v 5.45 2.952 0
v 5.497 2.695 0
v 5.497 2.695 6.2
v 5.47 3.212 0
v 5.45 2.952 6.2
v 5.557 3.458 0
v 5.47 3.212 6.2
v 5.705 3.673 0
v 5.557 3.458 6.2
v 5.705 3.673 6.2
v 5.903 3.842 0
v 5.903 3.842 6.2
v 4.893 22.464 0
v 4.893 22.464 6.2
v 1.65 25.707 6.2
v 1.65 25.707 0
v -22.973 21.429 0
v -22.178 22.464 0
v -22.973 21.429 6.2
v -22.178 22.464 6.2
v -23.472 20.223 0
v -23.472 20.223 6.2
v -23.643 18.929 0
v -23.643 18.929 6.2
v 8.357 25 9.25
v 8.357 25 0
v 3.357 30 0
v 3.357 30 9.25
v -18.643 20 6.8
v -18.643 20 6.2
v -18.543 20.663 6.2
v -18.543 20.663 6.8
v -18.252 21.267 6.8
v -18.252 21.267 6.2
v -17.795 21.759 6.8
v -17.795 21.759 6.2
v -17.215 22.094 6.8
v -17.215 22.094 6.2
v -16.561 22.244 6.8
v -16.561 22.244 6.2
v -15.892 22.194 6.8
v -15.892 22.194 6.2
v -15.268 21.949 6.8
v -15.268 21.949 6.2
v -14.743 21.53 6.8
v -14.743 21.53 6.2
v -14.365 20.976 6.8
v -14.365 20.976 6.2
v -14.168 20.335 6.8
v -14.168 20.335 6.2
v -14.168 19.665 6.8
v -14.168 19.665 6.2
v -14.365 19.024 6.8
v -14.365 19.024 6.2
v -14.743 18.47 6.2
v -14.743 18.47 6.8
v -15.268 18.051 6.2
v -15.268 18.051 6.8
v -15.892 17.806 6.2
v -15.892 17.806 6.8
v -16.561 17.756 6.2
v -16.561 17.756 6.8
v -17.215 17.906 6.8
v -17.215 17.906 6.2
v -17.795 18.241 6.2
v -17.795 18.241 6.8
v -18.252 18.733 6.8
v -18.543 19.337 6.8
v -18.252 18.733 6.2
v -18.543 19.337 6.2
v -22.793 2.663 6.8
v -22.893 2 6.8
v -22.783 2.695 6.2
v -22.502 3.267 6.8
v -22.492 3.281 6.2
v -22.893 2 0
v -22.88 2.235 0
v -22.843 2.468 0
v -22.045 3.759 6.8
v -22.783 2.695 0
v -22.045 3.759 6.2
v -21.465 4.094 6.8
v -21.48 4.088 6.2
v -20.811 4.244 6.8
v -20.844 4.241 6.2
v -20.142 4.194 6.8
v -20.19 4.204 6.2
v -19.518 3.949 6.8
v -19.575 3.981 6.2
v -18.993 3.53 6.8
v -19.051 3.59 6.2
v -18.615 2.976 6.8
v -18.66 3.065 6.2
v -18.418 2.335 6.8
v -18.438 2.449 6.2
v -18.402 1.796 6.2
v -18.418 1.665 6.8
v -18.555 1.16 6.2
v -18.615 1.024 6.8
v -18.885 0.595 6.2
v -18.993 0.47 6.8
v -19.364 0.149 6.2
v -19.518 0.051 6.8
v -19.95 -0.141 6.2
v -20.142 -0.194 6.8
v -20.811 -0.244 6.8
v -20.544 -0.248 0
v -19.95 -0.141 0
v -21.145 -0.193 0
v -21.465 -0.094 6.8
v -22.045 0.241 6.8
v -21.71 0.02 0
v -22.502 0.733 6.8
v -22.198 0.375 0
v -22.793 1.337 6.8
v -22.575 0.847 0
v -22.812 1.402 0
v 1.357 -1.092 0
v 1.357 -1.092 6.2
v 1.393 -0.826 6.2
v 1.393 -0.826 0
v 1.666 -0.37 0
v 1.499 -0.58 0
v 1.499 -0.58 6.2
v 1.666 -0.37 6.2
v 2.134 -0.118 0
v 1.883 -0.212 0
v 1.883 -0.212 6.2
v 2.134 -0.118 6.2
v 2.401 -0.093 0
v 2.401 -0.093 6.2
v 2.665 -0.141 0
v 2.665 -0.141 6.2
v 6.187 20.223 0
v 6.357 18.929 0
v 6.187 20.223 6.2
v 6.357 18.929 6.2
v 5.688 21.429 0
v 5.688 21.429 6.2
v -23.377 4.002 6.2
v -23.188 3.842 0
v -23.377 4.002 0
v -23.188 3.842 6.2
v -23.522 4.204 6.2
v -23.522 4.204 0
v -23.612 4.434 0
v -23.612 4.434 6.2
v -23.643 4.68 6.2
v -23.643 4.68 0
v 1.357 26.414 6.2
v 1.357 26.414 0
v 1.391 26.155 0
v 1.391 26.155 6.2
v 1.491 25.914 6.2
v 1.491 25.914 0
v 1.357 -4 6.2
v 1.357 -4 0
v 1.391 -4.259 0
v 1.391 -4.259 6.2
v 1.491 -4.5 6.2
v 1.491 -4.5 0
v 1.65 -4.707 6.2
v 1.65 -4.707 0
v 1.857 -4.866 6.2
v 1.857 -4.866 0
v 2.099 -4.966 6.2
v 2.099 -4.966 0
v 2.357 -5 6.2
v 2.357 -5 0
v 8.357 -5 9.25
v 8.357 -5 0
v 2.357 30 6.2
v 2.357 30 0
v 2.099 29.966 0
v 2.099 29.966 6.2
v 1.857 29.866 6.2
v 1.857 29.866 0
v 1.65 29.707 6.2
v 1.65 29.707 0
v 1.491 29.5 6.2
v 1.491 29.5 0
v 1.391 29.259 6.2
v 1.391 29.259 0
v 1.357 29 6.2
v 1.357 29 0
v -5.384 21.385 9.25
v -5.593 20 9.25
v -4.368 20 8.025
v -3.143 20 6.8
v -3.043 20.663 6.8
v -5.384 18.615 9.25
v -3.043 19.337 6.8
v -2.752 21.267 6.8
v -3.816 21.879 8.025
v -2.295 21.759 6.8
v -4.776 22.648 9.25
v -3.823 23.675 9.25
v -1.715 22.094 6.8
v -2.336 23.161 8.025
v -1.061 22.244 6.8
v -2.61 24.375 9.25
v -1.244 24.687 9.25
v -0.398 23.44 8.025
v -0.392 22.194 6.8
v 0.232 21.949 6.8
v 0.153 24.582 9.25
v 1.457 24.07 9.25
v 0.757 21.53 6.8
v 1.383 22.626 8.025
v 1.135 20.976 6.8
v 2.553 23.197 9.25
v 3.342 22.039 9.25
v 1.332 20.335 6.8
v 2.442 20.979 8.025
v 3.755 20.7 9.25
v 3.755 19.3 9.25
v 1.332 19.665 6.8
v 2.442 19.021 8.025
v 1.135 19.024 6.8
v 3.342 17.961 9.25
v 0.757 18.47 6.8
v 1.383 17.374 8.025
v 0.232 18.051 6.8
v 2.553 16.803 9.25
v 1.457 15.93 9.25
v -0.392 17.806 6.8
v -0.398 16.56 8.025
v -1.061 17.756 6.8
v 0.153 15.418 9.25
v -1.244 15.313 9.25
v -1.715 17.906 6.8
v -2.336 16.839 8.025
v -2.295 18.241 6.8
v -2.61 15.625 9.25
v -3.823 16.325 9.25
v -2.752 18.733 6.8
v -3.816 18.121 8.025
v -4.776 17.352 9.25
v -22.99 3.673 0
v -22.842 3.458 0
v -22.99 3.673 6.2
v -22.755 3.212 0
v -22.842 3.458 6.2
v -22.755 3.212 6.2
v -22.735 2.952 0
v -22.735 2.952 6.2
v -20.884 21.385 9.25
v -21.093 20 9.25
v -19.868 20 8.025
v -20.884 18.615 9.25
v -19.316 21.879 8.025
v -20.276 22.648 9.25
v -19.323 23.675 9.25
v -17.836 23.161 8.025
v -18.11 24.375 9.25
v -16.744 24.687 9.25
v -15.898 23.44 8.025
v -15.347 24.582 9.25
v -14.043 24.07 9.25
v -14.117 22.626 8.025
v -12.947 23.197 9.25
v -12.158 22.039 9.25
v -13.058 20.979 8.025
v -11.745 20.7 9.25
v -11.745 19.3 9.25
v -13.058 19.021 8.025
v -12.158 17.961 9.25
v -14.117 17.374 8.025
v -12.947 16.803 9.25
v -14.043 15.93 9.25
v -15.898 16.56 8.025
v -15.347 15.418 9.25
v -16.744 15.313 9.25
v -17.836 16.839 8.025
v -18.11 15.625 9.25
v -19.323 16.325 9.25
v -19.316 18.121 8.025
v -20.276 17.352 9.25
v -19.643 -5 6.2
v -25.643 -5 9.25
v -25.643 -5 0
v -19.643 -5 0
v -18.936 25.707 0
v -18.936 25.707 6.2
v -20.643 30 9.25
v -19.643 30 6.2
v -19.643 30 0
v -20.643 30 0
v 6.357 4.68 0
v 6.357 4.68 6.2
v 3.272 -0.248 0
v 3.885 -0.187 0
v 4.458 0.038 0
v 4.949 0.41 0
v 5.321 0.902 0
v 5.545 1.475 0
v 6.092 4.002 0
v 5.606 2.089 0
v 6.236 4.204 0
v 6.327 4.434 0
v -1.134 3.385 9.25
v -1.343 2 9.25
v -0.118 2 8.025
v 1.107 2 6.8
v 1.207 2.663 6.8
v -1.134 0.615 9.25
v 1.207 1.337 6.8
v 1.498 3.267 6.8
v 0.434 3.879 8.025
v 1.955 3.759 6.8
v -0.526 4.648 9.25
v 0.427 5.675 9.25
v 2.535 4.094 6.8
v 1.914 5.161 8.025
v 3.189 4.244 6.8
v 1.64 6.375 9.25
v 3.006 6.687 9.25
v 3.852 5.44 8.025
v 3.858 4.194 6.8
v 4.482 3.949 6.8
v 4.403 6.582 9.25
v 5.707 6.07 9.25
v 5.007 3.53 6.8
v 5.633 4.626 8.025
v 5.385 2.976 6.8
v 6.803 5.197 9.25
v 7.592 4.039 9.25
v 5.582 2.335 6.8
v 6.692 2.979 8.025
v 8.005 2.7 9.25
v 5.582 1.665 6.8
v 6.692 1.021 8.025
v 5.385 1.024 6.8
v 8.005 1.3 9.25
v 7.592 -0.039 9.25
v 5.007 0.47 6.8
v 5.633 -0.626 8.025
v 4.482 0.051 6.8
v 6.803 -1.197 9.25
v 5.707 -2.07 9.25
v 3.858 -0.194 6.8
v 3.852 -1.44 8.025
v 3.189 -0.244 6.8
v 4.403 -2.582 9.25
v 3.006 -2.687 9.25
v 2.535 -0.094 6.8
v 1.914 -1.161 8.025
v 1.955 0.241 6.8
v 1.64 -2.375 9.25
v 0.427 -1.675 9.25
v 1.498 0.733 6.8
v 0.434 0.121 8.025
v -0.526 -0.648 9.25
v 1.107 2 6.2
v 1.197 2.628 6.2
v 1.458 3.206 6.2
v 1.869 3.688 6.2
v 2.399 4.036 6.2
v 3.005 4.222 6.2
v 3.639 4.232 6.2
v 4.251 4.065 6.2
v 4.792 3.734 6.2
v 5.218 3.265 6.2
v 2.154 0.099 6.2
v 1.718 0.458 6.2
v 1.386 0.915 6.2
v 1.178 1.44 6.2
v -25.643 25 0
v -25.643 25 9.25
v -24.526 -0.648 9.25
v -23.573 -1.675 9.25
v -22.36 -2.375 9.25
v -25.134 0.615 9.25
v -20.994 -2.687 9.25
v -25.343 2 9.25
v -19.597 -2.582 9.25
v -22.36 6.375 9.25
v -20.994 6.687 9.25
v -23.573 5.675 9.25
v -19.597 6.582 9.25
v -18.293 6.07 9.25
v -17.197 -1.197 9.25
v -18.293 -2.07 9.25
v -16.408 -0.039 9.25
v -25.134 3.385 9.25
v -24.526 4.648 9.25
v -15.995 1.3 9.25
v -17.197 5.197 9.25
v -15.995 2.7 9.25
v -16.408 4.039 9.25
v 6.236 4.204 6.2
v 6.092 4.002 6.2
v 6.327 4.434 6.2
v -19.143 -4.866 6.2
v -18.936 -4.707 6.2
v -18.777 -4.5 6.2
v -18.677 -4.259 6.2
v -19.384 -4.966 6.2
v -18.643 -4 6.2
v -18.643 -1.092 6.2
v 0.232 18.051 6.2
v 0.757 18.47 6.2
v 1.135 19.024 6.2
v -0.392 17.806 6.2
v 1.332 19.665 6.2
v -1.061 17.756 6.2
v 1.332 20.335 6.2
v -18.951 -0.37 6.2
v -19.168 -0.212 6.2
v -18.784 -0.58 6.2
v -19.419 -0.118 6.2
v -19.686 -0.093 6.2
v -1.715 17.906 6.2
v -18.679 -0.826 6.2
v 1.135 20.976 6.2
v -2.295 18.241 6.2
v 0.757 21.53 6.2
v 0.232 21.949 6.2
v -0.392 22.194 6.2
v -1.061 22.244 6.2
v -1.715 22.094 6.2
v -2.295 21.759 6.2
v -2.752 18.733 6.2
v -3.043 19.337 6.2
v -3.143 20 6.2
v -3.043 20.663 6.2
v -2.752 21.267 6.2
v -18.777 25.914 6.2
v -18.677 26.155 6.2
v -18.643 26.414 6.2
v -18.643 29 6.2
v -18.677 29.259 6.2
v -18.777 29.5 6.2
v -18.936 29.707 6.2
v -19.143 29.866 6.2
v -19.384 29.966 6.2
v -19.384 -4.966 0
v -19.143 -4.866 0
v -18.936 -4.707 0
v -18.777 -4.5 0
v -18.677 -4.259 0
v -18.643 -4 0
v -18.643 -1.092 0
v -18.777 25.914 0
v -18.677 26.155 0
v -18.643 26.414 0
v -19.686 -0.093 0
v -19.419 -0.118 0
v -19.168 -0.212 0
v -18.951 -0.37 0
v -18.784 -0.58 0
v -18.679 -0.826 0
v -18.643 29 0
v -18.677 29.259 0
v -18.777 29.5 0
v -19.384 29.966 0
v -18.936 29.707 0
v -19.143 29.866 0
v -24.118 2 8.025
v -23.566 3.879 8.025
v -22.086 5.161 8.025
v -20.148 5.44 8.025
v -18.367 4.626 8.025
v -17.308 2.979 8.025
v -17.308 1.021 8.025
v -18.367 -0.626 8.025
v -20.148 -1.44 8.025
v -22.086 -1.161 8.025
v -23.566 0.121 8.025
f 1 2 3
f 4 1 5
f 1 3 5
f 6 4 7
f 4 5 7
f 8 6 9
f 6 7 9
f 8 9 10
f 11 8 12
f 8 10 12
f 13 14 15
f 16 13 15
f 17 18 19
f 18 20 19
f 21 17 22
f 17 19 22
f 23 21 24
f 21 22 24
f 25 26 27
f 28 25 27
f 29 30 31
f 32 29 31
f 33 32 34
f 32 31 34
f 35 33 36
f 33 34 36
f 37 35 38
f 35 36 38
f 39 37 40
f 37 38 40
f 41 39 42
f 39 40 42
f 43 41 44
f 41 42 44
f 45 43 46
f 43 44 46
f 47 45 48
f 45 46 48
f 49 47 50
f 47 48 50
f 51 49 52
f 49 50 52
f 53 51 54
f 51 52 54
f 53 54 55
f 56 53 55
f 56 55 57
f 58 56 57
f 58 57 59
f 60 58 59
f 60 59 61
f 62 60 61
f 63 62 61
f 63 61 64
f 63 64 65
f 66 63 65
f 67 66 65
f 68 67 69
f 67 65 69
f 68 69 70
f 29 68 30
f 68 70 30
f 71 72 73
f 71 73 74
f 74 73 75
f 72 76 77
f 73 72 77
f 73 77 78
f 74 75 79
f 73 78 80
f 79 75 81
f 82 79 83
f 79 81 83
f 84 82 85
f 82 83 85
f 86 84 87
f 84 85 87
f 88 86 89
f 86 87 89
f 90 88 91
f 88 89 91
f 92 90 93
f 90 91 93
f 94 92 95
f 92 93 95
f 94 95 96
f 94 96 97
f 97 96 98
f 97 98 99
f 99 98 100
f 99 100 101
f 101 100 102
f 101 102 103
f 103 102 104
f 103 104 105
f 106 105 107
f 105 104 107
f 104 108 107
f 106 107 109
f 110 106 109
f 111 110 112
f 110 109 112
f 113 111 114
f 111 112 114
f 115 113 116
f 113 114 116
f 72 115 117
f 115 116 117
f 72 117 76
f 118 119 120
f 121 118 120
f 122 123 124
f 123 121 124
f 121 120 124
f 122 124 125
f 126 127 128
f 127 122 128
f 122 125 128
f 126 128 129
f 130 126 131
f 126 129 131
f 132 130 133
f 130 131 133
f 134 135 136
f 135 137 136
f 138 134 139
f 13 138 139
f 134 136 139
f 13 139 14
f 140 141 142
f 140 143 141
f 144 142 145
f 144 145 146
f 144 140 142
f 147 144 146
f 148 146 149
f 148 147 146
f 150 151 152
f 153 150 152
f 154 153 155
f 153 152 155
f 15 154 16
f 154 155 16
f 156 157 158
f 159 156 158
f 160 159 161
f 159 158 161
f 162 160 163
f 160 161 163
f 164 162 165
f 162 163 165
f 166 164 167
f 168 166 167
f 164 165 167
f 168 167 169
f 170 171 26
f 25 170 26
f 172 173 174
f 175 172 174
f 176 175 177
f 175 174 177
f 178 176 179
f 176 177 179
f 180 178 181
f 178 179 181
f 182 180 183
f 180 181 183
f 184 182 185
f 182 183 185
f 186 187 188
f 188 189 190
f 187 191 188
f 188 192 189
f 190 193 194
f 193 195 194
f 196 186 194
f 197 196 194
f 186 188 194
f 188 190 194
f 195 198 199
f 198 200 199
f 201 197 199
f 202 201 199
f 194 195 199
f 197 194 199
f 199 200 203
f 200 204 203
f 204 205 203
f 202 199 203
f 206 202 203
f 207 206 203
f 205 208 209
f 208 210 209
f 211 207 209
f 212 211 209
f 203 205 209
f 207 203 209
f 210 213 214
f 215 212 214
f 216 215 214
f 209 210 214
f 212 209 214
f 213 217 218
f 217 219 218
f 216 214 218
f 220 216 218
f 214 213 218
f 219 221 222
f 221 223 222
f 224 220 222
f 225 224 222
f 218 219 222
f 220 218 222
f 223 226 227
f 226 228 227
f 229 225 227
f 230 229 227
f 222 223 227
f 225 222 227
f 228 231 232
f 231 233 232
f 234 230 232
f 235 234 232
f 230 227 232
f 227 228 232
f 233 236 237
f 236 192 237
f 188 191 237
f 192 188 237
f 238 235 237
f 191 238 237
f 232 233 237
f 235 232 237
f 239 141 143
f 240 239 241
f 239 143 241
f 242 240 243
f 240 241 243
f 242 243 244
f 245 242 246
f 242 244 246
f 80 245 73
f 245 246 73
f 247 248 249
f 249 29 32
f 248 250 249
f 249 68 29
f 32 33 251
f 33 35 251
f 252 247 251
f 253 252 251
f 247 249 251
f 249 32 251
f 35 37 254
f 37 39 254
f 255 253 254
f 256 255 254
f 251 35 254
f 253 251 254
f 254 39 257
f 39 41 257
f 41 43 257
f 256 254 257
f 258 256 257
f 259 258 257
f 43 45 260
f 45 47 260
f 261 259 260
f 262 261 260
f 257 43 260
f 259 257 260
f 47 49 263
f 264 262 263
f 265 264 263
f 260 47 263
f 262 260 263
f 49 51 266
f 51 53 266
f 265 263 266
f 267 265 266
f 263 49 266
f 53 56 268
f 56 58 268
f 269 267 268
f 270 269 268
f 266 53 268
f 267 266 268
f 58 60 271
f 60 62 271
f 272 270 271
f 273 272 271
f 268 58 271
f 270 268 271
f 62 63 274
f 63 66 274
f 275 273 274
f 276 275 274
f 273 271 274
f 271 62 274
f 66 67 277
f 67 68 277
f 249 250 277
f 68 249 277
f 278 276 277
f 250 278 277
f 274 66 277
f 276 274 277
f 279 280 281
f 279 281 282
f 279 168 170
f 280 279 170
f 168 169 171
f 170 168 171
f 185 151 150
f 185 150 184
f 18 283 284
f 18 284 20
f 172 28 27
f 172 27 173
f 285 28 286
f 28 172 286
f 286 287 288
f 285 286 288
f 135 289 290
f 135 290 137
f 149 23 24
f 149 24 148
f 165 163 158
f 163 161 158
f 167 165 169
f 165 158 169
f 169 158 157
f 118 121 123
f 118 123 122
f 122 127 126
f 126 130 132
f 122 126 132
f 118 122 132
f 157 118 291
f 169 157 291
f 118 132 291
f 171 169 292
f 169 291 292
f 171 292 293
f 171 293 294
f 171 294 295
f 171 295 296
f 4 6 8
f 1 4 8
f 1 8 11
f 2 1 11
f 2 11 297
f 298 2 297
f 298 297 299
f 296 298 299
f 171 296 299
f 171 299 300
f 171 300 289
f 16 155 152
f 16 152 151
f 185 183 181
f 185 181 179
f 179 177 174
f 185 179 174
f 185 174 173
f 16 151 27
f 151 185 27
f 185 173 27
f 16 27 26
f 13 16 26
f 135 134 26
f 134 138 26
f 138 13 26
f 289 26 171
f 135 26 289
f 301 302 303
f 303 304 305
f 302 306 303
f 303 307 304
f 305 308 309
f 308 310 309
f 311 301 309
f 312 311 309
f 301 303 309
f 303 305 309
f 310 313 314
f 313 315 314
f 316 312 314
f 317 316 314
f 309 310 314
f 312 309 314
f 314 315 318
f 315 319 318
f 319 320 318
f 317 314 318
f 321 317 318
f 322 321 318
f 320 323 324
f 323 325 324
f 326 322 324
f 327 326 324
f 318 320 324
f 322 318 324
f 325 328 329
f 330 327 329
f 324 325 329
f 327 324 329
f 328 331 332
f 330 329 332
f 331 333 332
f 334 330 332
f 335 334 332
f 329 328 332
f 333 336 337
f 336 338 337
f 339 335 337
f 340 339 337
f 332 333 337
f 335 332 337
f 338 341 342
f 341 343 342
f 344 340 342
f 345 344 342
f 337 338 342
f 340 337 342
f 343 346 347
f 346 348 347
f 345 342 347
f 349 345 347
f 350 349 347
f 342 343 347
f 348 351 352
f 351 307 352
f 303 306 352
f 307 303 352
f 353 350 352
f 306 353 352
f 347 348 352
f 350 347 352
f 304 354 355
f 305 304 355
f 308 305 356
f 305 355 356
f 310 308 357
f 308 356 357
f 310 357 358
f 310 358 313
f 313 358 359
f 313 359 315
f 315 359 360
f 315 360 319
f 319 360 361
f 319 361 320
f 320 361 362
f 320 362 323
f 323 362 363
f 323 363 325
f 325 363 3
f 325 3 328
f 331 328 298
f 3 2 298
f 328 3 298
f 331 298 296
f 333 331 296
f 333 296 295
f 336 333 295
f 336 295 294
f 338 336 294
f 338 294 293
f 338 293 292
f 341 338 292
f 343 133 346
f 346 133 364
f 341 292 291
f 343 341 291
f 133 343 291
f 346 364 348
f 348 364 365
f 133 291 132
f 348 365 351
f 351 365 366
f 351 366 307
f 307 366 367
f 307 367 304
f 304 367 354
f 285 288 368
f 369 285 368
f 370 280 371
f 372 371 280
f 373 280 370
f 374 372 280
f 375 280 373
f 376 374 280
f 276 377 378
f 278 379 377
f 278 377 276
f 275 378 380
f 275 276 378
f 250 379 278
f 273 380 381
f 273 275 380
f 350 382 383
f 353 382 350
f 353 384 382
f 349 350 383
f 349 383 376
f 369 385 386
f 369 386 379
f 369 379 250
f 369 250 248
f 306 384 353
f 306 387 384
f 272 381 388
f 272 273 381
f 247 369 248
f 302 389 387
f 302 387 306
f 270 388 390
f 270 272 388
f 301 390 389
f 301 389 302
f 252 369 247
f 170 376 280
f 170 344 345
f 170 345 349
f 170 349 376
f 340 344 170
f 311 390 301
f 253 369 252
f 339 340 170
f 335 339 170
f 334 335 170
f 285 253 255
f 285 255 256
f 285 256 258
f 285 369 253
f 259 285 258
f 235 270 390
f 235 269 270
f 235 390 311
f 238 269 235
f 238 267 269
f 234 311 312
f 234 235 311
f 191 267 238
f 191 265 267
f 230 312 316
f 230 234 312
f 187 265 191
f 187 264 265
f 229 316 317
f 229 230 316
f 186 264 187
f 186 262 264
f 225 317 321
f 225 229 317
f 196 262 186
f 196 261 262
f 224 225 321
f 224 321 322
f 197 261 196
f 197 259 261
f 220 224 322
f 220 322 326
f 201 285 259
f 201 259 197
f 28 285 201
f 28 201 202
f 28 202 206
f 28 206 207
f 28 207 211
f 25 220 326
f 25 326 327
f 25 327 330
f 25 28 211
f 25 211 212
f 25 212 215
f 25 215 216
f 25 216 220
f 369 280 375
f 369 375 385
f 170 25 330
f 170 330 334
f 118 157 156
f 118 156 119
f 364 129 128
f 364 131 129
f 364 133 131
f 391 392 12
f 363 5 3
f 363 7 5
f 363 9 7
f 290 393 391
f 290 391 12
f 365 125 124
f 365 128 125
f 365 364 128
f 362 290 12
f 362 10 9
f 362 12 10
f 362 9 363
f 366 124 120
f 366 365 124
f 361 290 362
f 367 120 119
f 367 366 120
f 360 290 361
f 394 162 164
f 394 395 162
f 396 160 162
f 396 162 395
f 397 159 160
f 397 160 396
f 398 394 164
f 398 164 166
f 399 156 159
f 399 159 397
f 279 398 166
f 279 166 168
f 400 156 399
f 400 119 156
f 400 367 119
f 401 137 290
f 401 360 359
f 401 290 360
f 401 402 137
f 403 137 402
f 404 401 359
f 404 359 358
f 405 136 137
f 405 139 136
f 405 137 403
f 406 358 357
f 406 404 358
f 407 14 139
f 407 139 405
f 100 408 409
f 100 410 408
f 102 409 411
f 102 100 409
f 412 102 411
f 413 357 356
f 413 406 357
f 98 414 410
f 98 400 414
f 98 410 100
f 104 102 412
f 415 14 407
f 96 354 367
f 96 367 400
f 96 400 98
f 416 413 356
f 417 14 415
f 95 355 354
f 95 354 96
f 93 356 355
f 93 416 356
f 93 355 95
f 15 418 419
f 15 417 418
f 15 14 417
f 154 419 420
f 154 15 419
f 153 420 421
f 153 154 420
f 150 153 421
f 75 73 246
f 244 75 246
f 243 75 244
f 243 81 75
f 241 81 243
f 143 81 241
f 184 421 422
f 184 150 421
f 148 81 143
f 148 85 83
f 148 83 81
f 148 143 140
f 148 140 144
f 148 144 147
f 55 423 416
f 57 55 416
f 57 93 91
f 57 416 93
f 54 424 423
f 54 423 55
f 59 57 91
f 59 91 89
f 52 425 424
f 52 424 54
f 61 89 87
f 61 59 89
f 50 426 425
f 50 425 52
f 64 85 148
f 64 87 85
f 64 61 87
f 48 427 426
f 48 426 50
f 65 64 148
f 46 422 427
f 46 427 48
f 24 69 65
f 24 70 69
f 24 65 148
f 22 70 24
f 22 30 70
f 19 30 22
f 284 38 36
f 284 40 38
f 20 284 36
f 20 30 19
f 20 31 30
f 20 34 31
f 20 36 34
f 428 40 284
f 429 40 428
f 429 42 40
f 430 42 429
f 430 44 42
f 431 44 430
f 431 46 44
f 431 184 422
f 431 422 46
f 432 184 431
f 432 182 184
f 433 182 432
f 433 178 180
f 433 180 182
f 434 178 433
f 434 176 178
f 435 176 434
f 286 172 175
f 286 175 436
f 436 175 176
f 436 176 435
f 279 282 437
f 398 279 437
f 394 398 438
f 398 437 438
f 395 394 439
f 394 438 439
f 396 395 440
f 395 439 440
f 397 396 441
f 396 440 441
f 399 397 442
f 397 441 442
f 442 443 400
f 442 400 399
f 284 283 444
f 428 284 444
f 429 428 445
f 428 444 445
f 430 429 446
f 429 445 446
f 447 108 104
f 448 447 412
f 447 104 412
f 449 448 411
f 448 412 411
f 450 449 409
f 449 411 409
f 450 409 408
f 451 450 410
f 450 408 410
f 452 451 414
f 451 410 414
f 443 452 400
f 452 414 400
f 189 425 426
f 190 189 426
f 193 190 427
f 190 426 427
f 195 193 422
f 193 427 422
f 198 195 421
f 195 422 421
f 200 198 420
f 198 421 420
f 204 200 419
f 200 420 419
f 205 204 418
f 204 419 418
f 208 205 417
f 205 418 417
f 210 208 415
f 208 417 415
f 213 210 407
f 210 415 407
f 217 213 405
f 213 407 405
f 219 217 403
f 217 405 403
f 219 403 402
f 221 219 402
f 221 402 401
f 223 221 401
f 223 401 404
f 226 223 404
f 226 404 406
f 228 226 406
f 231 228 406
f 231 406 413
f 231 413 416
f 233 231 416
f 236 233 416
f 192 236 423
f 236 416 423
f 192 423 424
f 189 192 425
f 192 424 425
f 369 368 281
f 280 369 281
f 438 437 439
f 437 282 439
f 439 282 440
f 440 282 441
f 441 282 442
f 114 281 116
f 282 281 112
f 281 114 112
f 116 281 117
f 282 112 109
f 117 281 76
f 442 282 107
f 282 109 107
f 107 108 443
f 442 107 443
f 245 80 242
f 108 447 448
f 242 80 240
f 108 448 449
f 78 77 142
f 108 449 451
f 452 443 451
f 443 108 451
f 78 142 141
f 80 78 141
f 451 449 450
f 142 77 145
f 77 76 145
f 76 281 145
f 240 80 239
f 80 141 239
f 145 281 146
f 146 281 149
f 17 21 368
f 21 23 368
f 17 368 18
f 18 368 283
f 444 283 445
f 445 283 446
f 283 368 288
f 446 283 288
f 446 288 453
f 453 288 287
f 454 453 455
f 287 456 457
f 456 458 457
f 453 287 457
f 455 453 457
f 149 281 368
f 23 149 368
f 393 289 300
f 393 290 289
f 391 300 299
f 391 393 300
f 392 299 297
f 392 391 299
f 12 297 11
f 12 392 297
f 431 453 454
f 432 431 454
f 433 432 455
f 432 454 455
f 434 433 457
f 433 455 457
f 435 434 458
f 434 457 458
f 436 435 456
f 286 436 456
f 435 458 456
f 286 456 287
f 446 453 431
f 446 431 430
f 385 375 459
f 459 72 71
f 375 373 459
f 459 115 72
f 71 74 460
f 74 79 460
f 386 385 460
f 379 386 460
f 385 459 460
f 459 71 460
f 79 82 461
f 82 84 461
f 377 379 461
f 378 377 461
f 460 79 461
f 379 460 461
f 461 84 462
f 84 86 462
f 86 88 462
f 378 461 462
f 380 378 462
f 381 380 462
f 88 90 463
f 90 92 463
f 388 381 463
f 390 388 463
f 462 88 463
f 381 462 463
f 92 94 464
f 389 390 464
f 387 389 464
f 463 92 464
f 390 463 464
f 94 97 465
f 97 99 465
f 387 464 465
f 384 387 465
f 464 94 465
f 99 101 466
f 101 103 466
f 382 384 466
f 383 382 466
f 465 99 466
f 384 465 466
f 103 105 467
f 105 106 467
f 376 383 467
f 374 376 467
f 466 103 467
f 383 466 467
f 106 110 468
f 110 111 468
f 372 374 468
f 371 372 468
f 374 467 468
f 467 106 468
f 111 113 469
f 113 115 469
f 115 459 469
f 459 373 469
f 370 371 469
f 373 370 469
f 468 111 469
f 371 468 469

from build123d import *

# Parameters (mm, degrees)
EXTRUDE1_DEPTH                                       = 9.25
CSK_FOR_M4_COUNTERSUNK_RAISED_HEAD_SCREW_D           = 4.5
CSK_FOR_M4_COUNTERSUNK_RAISED_HEAD_SCREW_CSINK_D     = 9.4
CSK_FOR_M4_COUNTERSUNK_RAISED_HEAD_SCREW_CSINK_ANGLE = 90
EXTRUDE2_DEPTH                                       = 6.2
FILLET1_R                                            = 1
FILLET2_R                                            = 1
FILLET3_R                                            = 5


with BuildPart() as part:
    # Sketch1 → Extrude1 (new body)
    with BuildSketch(Plane.XY):
        Polygon((3.357375606748374, 30), (-20.6426243932516, 30), (-25.642624393251616, 25.000000000000007), (-25.642624393251616, -4.999999999999999), (8.357375606748393, -4.999999999999999), (8.357375606748393, 25), align=None)
    extrude(amount=EXTRUDE1_DEPTH)

    # CSK for M4 Countersunk Raised Head Screw1 (through all)
    with Locations(Plane.XY.offset(9.249999999999995)):
        with Locations((-0.892624393, 20), (-16.392624393, 20), (-20.642624393, 2), (3.357375607, 2)):
            CounterSinkHole(CSK_FOR_M4_COUNTERSUNK_RAISED_HEAD_SCREW_D / 2, CSK_FOR_M4_COUNTERSUNK_RAISED_HEAD_SCREW_CSINK_D / 2, counter_sink_angle=CSK_FOR_M4_COUNTERSUNK_RAISED_HEAD_SCREW_CSINK_ANGLE)

    # Sketch6 → Extrude2 (cut)
    with BuildSketch(Plane(origin=(0, 0, 0), x_dir=(-1, 0, 0), z_dir=(0, 0, -1))):
        with BuildLine():
            Line((-1.357375606748385, -4.999999999999999), (-1.357375606748385, 1.9999999999999944))
            ThreePointArc((-1.357375606748385, 1.9999999999999944), (-1.9431620443752904, 3.4142135623730905), (-3.357375606748387, 3.9999999999999947))
            Line((-3.357375606748387, 3.9999999999999947), (-6.357375606748384, 3.9999999999999947))
            Line((-6.357375606748384, 3.9999999999999947), (-6.357375606748382, 20.999999999999996))
            Line((-6.357375606748382, 20.999999999999996), (-1.3573756067483855, 25.999999999999996))
            Line((-1.3573756067483855, 25.999999999999996), (-1.3573756067483855, 30))
            Line((-1.3573756067483855, 30), (18.642624393251616, 30))
            Line((18.642624393251616, 30), (18.642624393251616, 25.999999999999996))
            Line((18.642624393251616, 25.999999999999996), (23.642624393251612, 20.999999999999996))
            Line((23.642624393251612, 20.999999999999996), (23.642624393251612, 3.9999999999999947))
            Line((23.642624393251612, 3.9999999999999947), (20.642624393251616, 3.9999999999999947))
            ThreePointArc((20.642624393251616, 3.9999999999999947), (19.22841083087852, 3.4142135623730896), (18.642624393251616, 1.9999999999999944))
            Line((18.642624393251616, 1.9999999999999944), (18.642624393251616, -4.999999999999999))
            Line((18.642624393251616, -4.999999999999999), (-1.357375606748385, -4.999999999999999))
        make_face()
    extrude(amount=-EXTRUDE2_DEPTH, mode=Mode.SUBTRACT)

    # Fillet1
    # the kernel refuses this fillet: 1 mm, written as the material it takes off along each edge
    with BuildSketch(Plane(origin=(1.3573756067483842, -4.999999999999999, -2.5000000000000004), x_dir=(1, 0, 0), z_dir=(0, 0, 1))) as fillet1_piece_1:
        with BuildLine():
            CenterArc((FILLET1_R, FILLET1_R), FILLET1_R, 180, 90)
            Line((0, FILLET1_R), (0, 0))
            Line((0, 0), (FILLET1_R, 0))
        make_face()
    extrude(amount=8.700000000000001, mode=Mode.SUBTRACT)
    with BuildSketch(Plane(origin=(-18.642624393251616, -4.999999999999999, -2.5000000000000004), x_dir=(-1, 0, 0), z_dir=(0, 0, 1))) as fillet1_piece_2:
        with BuildLine():
            CenterArc((FILLET1_R, -FILLET1_R), FILLET1_R, 90, 90)
            Line((0, -FILLET1_R), (0, 0))
            Line((0, 0), (FILLET1_R, 0))
        make_face()
    extrude(amount=8.700000000000001, mode=Mode.SUBTRACT)
    with BuildSketch(Plane(origin=(-18.642624393251616, 30, -2.5000000000000004), x_dir=(-1, 0, 0), z_dir=(0, 0, 1))) as fillet1_piece_3:
        with BuildLine():
            CenterArc((FILLET1_R, FILLET1_R), FILLET1_R, 180, 90)
            Line((0, FILLET1_R), (0, 0))
            Line((0, 0), (FILLET1_R, 0))
        make_face()
    extrude(amount=8.700000000000001, mode=Mode.SUBTRACT)
    with BuildSketch(Plane(origin=(1.3573756067483855, 30, -2.5000000000000004), x_dir=(1, 0, 0), z_dir=(0, 0, 1))) as fillet1_piece_4:
        with BuildLine():
            CenterArc((FILLET1_R, -FILLET1_R), FILLET1_R, 90, 90)
            Line((0, -FILLET1_R), (0, 0))
            Line((0, 0), (FILLET1_R, 0))
        make_face()
    extrude(amount=8.700000000000001, mode=Mode.SUBTRACT)
    with BuildSketch(Plane(origin=(1.3573756067483855, 25.999999999999996, -1.0355339059327398), x_dir=(0, 1, 0), z_dir=(0, 0, 1))) as fillet1_piece_5:
        with BuildLine():
            CenterArc((FILLET1_R * 0.414213562373, -FILLET1_R), FILLET1_R, 90, 44.999999999999886)
            Line((-FILLET1_R * 0.292893218813, -FILLET1_R * 0.292893218813), (0, 0))
            Line((0, 0), (FILLET1_R * 0.414213562373, 0))
        make_face()
    extrude(amount=7.23553390593274, mode=Mode.SUBTRACT)
    with BuildSketch(Plane(origin=(-18.642624393251616, 25.999999999999996, -1.0355339059327398), x_dir=(0, 1, 0), z_dir=(0, 0, 1))) as fillet1_piece_6:
        with BuildLine():
            CenterArc((FILLET1_R * 0.414213562373, FILLET1_R), FILLET1_R, 225.0000000000001, 44.999999999999886)
            Line((-FILLET1_R * 0.292893218813, FILLET1_R * 0.292893218813), (0, 0))
            Line((0, 0), (FILLET1_R * 0.414213562373, 0))
        make_face()
    extrude(amount=7.23553390593274, mode=Mode.SUBTRACT)
    with BuildSketch(Plane(origin=(4.388152013404426, 3.9999999999999947, 6.2), x_dir=(0.6476614705960325, -0.7619282246415239, 0), z_dir=(0, 0, -1))) as fillet1_piece_7:
        with BuildLine():
            CenterArc((2.093085588135569, -0.924755812678291), FILLET1_R, 112.36843760662408, 102.77681294898315)
            Line((1.275390248397613, -1.5004070363987214), (0, 0))
            ThreePointArc((0, 0), (0.8562622860554598, -0.1692994214738442), (1.71252457211092, -2e-17))
        make_face()
    extrude(amount=11.123058983359915, mode=Mode.SUBTRACT)
    with BuildSketch(Plane(origin=(1.357375606748385, 0.9692235940837892, 6.2), x_dir=(0, -1, 0), z_dir=(0, 0, -1))) as fillet1_piece_8:
        with BuildLine():
            CenterArc((2.0615528132156675, -1), FILLET1_R, 90, 107.92021314405432)
            ThreePointArc((1.110066899636628, -1.3076923077697278), (0.6845392185374297, -0.5439119848812466), (0, 0))
            Line((0, 0), (2.0615528132156675, 0))
        make_face()
    extrude(amount=11.35388203303917, mode=Mode.SUBTRACT)
    with BuildSketch(Plane(origin=(-18.642624393251616, 0.9692235931073754, 6.2), x_dir=(0, -1, 0), z_dir=(0, 0, -1))) as fillet1_piece_9:
        with BuildLine():
            CenterArc((2.061552812401989, 1), FILLET1_R, 162.07978686526982, 107.92021313473018)
            ThreePointArc((1.1100668987728768, 1.3076923076148859), (0.6845392180349299, 0.543911984936301), (0, 0))
            Line((0, 0), (2.061552812401989, 0))
        make_face()
    extrude(amount=11.353882031004975, mode=Mode.SUBTRACT)
    with BuildSketch(Plane(origin=(-21.673400799404423, 3.9999999999999947, 6.2), x_dir=(-0.6476614705905301, -0.7619282246462011, 0), z_dir=(0, 0, -1))) as fillet1_piece_10:
        with BuildLine():
            CenterArc((2.0930855881723076, 0.9247558126755415), FILLET1_R, 144.8547494166881, 102.77681297627396)
            Line((1.2753902487127007, 1.5004070367913585), (0, 0))
            ThreePointArc((0, 0), (0.8562622860704877, 0.16929942148002802), (1.7125245721409794, -5e-17))
        make_face()
    extrude(amount=11.123058984617991, mode=Mode.SUBTRACT)

    # Fillet2
    fillet2_edges = [part.edges().sort_by_distance(p)[0] for p in [
        (-23.642624393251612, 3.9999999999999947, 3.1),
        (6.357375606748384, 3.9999999999999947, 3.1),
    ]]
    fillet(fillet2_edges, radius=FILLET2_R)

    # Fillet3
    fillet3_edges = [part.edges().sort_by_distance(p)[0] for p in [
        (6.357375606748382, 20.999999999999996, 3.1),
        (-23.642624393251612, 20.999999999999996, 3.1),
    ]]
    fillet(fillet3_edges, radius=FILLET3_R)


solid = part.part
